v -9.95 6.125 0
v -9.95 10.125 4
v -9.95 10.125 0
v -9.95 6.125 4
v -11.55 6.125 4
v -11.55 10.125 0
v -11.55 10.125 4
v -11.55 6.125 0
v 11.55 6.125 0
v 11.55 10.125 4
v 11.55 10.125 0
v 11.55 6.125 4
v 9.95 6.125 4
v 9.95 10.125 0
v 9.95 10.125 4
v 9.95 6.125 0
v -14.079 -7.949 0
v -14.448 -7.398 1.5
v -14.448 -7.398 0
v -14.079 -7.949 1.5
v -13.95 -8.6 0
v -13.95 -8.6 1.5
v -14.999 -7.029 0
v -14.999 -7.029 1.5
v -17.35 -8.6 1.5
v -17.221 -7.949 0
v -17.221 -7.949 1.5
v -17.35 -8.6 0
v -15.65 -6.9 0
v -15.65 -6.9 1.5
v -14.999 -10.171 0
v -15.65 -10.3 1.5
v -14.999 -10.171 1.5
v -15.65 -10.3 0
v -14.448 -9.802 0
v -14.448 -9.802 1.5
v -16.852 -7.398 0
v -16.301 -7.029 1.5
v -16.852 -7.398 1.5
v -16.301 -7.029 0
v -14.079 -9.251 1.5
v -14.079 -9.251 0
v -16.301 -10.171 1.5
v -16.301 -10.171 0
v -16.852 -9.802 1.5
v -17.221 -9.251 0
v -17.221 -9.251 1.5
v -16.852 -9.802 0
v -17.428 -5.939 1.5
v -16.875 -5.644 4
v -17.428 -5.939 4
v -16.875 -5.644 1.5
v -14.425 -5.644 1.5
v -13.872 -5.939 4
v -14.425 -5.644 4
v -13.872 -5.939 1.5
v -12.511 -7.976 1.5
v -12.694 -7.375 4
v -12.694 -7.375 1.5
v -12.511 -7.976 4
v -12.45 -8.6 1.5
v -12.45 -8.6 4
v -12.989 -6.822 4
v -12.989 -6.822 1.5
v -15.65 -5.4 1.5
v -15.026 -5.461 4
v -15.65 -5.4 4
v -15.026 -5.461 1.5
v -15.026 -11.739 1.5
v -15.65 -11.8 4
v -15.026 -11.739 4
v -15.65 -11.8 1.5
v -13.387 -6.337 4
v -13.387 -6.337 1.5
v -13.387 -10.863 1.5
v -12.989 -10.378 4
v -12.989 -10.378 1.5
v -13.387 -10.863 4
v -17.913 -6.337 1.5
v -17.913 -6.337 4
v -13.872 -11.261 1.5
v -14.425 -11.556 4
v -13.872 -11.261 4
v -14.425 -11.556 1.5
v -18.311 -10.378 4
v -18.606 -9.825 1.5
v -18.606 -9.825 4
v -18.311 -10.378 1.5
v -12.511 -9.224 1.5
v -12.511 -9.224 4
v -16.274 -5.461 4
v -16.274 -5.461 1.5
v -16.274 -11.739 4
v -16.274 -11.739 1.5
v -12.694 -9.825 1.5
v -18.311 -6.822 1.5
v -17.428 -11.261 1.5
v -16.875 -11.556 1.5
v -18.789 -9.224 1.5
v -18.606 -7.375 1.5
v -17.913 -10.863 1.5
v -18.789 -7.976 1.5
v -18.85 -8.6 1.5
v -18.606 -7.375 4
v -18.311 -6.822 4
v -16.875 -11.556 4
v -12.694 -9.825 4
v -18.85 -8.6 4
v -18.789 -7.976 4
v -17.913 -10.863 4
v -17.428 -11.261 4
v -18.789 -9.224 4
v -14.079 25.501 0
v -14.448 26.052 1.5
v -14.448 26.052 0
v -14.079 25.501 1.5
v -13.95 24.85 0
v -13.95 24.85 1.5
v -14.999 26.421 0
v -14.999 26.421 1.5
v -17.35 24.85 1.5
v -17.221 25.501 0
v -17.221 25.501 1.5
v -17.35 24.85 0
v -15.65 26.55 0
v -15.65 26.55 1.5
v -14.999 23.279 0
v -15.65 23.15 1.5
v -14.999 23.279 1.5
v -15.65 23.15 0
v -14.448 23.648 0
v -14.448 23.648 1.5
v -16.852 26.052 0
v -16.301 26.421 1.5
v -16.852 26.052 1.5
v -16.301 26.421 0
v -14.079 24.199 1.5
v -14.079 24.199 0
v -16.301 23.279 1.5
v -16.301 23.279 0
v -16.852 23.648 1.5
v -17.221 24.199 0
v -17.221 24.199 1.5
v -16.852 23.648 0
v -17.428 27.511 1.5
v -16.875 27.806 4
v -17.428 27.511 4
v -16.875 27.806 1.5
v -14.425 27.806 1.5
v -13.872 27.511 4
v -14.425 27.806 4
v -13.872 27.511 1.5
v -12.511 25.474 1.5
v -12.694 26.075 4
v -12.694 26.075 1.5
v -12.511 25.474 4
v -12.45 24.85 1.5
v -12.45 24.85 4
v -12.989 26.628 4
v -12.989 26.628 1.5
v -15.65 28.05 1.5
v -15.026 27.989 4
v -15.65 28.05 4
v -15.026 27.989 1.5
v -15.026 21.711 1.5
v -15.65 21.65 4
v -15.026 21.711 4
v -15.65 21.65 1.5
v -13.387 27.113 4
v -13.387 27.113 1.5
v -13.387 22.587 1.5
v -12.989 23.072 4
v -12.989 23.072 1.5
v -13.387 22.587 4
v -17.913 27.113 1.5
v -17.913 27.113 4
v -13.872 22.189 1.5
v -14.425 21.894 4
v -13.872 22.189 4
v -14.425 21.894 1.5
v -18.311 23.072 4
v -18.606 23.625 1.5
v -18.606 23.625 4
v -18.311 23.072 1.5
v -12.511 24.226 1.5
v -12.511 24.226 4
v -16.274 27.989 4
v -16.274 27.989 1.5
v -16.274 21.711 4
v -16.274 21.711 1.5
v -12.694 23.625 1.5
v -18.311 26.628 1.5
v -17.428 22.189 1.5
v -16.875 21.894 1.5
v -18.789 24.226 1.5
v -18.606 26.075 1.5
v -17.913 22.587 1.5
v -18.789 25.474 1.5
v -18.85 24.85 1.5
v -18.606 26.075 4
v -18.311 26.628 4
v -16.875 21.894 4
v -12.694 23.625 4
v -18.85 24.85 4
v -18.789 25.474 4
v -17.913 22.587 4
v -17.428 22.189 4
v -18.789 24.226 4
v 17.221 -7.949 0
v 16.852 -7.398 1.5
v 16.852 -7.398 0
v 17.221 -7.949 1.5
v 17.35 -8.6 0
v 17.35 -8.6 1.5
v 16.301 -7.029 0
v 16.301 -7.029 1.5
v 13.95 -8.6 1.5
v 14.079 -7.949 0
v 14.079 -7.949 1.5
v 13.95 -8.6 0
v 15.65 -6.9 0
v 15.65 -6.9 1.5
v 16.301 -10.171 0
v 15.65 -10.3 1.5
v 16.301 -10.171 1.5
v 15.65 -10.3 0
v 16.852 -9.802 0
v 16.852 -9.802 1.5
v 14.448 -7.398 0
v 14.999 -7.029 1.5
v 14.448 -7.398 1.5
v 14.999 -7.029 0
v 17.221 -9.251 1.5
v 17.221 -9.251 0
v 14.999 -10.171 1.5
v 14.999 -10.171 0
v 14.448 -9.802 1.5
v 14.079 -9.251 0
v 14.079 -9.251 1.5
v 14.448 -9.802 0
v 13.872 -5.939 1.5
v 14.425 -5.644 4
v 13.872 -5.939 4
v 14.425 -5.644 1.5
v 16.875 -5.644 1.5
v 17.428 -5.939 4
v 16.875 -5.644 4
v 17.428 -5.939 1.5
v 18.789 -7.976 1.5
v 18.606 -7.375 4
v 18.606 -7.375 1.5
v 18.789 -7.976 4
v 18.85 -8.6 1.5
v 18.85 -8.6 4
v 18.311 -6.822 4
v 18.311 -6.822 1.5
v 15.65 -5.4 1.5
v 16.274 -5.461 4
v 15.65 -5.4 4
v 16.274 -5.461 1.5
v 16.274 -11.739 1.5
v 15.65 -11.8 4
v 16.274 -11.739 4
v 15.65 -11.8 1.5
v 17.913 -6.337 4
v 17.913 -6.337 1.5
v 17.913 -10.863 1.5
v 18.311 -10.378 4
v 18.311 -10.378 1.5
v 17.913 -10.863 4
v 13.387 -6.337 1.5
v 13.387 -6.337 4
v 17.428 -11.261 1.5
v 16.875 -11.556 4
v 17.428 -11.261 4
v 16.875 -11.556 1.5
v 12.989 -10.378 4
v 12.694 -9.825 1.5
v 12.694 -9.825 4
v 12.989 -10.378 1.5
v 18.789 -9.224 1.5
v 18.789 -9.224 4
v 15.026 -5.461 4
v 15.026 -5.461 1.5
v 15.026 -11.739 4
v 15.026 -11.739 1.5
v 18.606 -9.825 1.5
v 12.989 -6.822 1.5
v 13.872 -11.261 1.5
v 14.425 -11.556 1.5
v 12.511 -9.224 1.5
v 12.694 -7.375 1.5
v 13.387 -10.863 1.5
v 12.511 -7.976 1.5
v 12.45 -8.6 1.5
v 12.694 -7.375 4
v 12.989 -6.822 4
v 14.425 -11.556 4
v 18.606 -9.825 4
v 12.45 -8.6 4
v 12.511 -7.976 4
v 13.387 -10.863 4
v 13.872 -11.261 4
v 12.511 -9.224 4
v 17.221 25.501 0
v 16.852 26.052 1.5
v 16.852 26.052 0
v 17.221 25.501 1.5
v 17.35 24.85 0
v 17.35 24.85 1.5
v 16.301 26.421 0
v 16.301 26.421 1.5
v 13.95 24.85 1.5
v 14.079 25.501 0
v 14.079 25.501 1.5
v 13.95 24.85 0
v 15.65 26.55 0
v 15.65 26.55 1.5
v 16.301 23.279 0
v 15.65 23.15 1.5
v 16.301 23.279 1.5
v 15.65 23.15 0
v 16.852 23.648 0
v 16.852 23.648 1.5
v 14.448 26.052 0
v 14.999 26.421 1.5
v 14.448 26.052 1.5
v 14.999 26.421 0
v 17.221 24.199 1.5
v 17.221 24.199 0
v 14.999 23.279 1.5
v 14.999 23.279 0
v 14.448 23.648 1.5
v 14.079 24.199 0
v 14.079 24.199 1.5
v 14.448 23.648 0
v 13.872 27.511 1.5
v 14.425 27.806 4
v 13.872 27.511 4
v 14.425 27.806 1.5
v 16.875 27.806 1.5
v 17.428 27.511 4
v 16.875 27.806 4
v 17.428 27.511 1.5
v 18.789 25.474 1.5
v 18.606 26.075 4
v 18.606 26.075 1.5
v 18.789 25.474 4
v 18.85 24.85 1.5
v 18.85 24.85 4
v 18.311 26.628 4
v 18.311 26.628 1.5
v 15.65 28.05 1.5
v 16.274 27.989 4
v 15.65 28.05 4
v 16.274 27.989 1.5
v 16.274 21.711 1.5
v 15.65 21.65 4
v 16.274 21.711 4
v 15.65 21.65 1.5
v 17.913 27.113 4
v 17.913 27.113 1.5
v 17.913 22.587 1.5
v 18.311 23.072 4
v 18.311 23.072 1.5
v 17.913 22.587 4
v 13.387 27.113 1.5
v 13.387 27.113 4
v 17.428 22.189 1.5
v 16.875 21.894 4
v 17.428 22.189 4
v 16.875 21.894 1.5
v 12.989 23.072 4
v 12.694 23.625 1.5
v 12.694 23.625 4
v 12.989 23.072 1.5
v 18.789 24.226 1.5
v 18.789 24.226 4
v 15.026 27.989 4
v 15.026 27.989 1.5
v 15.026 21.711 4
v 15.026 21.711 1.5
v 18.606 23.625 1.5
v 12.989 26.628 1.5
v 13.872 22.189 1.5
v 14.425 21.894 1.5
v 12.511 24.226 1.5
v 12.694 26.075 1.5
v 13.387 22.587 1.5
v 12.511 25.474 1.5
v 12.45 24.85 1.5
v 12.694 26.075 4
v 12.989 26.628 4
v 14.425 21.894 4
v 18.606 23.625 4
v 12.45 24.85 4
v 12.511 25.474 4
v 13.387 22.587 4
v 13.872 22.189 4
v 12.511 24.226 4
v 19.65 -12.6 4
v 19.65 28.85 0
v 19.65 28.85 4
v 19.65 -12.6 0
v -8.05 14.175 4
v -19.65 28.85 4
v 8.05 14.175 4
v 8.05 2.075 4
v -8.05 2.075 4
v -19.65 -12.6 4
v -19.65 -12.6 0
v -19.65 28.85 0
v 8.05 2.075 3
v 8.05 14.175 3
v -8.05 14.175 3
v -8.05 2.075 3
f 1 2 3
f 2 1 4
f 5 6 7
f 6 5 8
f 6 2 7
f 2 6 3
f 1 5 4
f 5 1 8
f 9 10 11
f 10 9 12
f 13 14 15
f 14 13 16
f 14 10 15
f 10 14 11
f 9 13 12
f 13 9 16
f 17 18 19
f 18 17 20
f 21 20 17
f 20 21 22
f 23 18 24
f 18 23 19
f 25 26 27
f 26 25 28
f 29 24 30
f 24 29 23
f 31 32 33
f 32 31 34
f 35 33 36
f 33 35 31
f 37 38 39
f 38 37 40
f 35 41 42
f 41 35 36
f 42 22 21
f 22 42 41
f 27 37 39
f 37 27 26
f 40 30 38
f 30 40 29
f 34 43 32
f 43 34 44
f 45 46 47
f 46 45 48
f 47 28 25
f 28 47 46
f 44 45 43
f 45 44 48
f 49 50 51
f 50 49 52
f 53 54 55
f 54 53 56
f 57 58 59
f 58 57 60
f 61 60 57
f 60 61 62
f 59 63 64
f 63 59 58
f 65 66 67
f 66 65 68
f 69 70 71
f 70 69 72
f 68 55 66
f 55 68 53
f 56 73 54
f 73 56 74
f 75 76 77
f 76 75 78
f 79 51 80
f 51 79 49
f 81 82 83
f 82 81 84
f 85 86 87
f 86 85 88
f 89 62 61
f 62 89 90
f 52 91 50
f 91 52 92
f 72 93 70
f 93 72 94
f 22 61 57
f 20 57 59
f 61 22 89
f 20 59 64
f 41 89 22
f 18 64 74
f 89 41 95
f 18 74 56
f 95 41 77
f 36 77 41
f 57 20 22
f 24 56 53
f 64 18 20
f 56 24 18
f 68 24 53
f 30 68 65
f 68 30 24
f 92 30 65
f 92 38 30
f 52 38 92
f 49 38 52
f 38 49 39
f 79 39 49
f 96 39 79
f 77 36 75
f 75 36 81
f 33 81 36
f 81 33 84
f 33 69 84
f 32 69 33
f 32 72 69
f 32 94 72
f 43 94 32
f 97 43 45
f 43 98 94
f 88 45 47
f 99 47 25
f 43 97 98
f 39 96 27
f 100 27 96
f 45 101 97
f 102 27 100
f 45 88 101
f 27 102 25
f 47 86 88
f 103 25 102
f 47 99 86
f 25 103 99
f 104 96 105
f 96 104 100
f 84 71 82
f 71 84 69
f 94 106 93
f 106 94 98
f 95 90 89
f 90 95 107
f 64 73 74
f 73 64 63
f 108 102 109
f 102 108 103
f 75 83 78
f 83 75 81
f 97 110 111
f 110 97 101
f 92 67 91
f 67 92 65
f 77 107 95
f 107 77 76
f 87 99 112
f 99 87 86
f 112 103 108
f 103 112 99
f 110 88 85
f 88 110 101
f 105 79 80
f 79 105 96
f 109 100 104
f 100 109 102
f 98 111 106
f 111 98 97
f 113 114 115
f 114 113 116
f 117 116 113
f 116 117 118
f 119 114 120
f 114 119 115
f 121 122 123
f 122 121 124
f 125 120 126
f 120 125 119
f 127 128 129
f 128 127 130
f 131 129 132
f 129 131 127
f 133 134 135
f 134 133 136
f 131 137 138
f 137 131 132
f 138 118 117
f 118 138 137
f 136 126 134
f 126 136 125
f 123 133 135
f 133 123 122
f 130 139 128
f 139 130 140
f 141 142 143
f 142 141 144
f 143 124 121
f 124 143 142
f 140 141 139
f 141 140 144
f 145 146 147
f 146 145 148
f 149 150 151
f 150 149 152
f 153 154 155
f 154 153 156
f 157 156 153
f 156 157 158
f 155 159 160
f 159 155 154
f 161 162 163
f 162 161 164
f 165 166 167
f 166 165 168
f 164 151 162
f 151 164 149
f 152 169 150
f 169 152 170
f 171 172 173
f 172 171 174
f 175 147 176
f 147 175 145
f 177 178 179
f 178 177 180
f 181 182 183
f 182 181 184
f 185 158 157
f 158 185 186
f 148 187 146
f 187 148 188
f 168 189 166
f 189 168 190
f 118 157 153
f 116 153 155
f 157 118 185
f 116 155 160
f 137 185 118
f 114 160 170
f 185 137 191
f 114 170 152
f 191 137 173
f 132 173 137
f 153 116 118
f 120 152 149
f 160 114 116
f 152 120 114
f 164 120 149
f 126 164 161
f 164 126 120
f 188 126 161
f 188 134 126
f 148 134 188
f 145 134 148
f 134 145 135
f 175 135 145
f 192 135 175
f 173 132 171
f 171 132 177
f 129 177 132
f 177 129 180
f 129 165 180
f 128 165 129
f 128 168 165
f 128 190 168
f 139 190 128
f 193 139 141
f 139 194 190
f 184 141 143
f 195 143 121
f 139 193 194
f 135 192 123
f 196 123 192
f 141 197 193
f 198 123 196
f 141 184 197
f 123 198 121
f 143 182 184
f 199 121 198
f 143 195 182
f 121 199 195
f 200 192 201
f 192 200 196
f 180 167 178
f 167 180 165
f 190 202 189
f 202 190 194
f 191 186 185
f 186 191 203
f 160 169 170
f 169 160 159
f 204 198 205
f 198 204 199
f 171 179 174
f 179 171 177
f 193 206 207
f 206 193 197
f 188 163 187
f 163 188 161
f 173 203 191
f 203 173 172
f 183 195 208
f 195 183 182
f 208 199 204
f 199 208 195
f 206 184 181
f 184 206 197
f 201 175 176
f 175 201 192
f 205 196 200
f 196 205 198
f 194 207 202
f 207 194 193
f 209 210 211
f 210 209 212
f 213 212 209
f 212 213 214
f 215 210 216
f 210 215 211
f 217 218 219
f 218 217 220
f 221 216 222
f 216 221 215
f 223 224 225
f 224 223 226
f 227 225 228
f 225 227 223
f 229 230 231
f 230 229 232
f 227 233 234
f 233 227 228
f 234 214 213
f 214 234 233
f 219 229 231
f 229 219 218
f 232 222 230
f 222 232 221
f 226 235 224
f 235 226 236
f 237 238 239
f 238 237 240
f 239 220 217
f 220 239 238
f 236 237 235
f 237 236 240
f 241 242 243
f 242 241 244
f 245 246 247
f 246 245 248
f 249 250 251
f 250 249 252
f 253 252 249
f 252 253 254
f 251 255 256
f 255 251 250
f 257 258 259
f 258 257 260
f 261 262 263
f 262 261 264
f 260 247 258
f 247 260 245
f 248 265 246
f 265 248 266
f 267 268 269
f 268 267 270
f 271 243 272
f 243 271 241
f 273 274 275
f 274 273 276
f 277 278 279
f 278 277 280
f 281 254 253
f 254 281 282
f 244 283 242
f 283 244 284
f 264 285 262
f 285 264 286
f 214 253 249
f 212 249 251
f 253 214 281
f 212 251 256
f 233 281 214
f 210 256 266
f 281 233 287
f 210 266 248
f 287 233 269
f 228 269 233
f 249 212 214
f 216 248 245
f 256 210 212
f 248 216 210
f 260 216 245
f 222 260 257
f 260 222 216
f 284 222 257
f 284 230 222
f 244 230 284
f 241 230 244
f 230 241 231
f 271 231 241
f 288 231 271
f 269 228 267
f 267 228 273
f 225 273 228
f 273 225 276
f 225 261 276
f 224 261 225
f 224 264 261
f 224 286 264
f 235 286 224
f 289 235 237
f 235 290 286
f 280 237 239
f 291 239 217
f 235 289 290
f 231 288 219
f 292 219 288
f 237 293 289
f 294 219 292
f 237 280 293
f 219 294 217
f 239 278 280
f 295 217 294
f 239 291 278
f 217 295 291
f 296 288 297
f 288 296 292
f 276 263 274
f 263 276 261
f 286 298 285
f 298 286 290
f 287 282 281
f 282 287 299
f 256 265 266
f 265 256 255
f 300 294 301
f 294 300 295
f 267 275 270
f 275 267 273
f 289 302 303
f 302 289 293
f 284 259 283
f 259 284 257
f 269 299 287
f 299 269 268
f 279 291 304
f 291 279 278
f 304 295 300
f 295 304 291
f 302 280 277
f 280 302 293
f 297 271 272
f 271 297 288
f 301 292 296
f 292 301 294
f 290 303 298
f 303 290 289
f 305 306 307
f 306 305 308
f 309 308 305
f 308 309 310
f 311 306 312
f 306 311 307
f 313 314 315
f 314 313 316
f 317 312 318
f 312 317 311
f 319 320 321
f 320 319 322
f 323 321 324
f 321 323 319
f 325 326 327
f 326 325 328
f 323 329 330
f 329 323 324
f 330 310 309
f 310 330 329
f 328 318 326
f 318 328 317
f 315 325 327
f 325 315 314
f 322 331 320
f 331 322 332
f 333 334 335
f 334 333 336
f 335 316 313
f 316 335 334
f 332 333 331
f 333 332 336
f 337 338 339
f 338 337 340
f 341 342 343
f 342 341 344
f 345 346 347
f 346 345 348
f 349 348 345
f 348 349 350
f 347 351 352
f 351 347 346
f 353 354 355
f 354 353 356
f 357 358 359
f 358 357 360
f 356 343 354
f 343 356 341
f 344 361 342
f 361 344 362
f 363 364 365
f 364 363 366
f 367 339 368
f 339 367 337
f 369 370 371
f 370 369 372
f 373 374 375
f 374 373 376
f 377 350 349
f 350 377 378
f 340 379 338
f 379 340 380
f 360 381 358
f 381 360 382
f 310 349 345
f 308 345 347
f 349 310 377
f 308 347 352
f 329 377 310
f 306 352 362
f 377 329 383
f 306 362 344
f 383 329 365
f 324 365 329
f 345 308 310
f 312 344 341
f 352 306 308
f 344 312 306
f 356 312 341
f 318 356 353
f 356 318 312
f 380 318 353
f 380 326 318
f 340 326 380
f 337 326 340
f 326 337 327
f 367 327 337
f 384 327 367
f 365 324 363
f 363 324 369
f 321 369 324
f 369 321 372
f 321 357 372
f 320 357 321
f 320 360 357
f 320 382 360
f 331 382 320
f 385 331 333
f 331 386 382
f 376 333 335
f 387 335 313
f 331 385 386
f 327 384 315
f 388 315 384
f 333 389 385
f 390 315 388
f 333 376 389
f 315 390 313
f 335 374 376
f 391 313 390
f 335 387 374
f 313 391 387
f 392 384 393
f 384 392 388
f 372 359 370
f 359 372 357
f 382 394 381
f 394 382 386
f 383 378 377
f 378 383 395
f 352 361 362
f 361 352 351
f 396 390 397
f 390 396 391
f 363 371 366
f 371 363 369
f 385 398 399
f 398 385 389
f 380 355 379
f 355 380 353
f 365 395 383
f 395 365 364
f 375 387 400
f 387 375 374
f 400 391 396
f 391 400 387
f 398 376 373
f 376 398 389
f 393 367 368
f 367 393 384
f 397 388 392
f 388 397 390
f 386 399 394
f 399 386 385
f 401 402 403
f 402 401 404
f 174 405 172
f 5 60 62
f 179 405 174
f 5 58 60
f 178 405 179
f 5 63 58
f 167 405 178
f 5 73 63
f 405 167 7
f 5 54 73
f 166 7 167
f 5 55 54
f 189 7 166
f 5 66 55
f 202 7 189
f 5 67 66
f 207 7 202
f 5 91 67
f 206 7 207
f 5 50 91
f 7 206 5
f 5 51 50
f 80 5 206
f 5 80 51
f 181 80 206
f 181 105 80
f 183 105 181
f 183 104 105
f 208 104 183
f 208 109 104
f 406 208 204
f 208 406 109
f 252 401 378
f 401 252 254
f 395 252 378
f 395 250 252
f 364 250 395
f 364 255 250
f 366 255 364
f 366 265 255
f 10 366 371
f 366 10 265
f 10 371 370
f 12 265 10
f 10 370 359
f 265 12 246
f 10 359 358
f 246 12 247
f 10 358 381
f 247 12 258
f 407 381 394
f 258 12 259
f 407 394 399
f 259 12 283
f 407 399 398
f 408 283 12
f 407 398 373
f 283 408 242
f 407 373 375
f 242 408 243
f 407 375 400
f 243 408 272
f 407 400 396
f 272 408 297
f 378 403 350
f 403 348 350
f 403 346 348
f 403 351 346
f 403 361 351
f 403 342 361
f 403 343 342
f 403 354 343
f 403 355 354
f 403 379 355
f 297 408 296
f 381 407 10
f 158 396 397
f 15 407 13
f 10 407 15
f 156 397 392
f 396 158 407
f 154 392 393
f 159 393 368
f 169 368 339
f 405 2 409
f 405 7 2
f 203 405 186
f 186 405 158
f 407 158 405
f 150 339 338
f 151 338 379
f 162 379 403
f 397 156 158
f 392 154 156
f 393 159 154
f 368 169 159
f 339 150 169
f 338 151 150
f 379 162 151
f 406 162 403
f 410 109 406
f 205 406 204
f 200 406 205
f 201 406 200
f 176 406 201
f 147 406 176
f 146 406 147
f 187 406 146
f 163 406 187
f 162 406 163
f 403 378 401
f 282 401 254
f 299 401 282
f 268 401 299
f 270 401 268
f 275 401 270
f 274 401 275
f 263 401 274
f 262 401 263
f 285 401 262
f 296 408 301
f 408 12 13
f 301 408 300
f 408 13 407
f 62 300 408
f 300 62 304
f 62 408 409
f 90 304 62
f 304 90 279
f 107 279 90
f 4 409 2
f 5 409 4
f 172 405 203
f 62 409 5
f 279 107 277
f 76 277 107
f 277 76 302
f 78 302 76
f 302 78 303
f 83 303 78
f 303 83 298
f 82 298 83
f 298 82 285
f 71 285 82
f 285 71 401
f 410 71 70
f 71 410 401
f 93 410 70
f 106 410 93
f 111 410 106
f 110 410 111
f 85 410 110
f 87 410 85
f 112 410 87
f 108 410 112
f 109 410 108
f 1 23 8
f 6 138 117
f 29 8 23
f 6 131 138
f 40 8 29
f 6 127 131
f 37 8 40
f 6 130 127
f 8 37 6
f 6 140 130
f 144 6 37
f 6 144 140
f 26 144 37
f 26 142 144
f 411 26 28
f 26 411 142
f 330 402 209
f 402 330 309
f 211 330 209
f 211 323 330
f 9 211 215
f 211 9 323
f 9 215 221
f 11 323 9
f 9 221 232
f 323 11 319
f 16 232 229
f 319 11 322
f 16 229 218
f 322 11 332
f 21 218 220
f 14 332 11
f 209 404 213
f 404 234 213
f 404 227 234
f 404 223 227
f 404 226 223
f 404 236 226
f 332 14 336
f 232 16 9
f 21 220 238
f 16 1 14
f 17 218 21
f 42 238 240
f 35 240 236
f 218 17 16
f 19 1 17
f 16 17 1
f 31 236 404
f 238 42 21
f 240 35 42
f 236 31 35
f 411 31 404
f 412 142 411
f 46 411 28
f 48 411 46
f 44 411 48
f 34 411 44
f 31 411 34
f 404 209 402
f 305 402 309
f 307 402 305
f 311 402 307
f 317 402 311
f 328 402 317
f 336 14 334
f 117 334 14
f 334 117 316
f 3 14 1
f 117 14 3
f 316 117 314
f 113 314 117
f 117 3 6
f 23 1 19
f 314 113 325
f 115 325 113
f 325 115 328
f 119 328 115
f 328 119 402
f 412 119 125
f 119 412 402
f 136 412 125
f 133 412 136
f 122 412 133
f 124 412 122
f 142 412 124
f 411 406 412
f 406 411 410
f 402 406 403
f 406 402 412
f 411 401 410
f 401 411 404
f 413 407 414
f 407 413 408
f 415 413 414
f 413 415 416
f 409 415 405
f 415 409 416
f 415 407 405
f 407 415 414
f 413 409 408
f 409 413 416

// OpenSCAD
include <../lib/servo-duct-manifold-lib.scad>;
$fn = 96;
sensor_tray();
